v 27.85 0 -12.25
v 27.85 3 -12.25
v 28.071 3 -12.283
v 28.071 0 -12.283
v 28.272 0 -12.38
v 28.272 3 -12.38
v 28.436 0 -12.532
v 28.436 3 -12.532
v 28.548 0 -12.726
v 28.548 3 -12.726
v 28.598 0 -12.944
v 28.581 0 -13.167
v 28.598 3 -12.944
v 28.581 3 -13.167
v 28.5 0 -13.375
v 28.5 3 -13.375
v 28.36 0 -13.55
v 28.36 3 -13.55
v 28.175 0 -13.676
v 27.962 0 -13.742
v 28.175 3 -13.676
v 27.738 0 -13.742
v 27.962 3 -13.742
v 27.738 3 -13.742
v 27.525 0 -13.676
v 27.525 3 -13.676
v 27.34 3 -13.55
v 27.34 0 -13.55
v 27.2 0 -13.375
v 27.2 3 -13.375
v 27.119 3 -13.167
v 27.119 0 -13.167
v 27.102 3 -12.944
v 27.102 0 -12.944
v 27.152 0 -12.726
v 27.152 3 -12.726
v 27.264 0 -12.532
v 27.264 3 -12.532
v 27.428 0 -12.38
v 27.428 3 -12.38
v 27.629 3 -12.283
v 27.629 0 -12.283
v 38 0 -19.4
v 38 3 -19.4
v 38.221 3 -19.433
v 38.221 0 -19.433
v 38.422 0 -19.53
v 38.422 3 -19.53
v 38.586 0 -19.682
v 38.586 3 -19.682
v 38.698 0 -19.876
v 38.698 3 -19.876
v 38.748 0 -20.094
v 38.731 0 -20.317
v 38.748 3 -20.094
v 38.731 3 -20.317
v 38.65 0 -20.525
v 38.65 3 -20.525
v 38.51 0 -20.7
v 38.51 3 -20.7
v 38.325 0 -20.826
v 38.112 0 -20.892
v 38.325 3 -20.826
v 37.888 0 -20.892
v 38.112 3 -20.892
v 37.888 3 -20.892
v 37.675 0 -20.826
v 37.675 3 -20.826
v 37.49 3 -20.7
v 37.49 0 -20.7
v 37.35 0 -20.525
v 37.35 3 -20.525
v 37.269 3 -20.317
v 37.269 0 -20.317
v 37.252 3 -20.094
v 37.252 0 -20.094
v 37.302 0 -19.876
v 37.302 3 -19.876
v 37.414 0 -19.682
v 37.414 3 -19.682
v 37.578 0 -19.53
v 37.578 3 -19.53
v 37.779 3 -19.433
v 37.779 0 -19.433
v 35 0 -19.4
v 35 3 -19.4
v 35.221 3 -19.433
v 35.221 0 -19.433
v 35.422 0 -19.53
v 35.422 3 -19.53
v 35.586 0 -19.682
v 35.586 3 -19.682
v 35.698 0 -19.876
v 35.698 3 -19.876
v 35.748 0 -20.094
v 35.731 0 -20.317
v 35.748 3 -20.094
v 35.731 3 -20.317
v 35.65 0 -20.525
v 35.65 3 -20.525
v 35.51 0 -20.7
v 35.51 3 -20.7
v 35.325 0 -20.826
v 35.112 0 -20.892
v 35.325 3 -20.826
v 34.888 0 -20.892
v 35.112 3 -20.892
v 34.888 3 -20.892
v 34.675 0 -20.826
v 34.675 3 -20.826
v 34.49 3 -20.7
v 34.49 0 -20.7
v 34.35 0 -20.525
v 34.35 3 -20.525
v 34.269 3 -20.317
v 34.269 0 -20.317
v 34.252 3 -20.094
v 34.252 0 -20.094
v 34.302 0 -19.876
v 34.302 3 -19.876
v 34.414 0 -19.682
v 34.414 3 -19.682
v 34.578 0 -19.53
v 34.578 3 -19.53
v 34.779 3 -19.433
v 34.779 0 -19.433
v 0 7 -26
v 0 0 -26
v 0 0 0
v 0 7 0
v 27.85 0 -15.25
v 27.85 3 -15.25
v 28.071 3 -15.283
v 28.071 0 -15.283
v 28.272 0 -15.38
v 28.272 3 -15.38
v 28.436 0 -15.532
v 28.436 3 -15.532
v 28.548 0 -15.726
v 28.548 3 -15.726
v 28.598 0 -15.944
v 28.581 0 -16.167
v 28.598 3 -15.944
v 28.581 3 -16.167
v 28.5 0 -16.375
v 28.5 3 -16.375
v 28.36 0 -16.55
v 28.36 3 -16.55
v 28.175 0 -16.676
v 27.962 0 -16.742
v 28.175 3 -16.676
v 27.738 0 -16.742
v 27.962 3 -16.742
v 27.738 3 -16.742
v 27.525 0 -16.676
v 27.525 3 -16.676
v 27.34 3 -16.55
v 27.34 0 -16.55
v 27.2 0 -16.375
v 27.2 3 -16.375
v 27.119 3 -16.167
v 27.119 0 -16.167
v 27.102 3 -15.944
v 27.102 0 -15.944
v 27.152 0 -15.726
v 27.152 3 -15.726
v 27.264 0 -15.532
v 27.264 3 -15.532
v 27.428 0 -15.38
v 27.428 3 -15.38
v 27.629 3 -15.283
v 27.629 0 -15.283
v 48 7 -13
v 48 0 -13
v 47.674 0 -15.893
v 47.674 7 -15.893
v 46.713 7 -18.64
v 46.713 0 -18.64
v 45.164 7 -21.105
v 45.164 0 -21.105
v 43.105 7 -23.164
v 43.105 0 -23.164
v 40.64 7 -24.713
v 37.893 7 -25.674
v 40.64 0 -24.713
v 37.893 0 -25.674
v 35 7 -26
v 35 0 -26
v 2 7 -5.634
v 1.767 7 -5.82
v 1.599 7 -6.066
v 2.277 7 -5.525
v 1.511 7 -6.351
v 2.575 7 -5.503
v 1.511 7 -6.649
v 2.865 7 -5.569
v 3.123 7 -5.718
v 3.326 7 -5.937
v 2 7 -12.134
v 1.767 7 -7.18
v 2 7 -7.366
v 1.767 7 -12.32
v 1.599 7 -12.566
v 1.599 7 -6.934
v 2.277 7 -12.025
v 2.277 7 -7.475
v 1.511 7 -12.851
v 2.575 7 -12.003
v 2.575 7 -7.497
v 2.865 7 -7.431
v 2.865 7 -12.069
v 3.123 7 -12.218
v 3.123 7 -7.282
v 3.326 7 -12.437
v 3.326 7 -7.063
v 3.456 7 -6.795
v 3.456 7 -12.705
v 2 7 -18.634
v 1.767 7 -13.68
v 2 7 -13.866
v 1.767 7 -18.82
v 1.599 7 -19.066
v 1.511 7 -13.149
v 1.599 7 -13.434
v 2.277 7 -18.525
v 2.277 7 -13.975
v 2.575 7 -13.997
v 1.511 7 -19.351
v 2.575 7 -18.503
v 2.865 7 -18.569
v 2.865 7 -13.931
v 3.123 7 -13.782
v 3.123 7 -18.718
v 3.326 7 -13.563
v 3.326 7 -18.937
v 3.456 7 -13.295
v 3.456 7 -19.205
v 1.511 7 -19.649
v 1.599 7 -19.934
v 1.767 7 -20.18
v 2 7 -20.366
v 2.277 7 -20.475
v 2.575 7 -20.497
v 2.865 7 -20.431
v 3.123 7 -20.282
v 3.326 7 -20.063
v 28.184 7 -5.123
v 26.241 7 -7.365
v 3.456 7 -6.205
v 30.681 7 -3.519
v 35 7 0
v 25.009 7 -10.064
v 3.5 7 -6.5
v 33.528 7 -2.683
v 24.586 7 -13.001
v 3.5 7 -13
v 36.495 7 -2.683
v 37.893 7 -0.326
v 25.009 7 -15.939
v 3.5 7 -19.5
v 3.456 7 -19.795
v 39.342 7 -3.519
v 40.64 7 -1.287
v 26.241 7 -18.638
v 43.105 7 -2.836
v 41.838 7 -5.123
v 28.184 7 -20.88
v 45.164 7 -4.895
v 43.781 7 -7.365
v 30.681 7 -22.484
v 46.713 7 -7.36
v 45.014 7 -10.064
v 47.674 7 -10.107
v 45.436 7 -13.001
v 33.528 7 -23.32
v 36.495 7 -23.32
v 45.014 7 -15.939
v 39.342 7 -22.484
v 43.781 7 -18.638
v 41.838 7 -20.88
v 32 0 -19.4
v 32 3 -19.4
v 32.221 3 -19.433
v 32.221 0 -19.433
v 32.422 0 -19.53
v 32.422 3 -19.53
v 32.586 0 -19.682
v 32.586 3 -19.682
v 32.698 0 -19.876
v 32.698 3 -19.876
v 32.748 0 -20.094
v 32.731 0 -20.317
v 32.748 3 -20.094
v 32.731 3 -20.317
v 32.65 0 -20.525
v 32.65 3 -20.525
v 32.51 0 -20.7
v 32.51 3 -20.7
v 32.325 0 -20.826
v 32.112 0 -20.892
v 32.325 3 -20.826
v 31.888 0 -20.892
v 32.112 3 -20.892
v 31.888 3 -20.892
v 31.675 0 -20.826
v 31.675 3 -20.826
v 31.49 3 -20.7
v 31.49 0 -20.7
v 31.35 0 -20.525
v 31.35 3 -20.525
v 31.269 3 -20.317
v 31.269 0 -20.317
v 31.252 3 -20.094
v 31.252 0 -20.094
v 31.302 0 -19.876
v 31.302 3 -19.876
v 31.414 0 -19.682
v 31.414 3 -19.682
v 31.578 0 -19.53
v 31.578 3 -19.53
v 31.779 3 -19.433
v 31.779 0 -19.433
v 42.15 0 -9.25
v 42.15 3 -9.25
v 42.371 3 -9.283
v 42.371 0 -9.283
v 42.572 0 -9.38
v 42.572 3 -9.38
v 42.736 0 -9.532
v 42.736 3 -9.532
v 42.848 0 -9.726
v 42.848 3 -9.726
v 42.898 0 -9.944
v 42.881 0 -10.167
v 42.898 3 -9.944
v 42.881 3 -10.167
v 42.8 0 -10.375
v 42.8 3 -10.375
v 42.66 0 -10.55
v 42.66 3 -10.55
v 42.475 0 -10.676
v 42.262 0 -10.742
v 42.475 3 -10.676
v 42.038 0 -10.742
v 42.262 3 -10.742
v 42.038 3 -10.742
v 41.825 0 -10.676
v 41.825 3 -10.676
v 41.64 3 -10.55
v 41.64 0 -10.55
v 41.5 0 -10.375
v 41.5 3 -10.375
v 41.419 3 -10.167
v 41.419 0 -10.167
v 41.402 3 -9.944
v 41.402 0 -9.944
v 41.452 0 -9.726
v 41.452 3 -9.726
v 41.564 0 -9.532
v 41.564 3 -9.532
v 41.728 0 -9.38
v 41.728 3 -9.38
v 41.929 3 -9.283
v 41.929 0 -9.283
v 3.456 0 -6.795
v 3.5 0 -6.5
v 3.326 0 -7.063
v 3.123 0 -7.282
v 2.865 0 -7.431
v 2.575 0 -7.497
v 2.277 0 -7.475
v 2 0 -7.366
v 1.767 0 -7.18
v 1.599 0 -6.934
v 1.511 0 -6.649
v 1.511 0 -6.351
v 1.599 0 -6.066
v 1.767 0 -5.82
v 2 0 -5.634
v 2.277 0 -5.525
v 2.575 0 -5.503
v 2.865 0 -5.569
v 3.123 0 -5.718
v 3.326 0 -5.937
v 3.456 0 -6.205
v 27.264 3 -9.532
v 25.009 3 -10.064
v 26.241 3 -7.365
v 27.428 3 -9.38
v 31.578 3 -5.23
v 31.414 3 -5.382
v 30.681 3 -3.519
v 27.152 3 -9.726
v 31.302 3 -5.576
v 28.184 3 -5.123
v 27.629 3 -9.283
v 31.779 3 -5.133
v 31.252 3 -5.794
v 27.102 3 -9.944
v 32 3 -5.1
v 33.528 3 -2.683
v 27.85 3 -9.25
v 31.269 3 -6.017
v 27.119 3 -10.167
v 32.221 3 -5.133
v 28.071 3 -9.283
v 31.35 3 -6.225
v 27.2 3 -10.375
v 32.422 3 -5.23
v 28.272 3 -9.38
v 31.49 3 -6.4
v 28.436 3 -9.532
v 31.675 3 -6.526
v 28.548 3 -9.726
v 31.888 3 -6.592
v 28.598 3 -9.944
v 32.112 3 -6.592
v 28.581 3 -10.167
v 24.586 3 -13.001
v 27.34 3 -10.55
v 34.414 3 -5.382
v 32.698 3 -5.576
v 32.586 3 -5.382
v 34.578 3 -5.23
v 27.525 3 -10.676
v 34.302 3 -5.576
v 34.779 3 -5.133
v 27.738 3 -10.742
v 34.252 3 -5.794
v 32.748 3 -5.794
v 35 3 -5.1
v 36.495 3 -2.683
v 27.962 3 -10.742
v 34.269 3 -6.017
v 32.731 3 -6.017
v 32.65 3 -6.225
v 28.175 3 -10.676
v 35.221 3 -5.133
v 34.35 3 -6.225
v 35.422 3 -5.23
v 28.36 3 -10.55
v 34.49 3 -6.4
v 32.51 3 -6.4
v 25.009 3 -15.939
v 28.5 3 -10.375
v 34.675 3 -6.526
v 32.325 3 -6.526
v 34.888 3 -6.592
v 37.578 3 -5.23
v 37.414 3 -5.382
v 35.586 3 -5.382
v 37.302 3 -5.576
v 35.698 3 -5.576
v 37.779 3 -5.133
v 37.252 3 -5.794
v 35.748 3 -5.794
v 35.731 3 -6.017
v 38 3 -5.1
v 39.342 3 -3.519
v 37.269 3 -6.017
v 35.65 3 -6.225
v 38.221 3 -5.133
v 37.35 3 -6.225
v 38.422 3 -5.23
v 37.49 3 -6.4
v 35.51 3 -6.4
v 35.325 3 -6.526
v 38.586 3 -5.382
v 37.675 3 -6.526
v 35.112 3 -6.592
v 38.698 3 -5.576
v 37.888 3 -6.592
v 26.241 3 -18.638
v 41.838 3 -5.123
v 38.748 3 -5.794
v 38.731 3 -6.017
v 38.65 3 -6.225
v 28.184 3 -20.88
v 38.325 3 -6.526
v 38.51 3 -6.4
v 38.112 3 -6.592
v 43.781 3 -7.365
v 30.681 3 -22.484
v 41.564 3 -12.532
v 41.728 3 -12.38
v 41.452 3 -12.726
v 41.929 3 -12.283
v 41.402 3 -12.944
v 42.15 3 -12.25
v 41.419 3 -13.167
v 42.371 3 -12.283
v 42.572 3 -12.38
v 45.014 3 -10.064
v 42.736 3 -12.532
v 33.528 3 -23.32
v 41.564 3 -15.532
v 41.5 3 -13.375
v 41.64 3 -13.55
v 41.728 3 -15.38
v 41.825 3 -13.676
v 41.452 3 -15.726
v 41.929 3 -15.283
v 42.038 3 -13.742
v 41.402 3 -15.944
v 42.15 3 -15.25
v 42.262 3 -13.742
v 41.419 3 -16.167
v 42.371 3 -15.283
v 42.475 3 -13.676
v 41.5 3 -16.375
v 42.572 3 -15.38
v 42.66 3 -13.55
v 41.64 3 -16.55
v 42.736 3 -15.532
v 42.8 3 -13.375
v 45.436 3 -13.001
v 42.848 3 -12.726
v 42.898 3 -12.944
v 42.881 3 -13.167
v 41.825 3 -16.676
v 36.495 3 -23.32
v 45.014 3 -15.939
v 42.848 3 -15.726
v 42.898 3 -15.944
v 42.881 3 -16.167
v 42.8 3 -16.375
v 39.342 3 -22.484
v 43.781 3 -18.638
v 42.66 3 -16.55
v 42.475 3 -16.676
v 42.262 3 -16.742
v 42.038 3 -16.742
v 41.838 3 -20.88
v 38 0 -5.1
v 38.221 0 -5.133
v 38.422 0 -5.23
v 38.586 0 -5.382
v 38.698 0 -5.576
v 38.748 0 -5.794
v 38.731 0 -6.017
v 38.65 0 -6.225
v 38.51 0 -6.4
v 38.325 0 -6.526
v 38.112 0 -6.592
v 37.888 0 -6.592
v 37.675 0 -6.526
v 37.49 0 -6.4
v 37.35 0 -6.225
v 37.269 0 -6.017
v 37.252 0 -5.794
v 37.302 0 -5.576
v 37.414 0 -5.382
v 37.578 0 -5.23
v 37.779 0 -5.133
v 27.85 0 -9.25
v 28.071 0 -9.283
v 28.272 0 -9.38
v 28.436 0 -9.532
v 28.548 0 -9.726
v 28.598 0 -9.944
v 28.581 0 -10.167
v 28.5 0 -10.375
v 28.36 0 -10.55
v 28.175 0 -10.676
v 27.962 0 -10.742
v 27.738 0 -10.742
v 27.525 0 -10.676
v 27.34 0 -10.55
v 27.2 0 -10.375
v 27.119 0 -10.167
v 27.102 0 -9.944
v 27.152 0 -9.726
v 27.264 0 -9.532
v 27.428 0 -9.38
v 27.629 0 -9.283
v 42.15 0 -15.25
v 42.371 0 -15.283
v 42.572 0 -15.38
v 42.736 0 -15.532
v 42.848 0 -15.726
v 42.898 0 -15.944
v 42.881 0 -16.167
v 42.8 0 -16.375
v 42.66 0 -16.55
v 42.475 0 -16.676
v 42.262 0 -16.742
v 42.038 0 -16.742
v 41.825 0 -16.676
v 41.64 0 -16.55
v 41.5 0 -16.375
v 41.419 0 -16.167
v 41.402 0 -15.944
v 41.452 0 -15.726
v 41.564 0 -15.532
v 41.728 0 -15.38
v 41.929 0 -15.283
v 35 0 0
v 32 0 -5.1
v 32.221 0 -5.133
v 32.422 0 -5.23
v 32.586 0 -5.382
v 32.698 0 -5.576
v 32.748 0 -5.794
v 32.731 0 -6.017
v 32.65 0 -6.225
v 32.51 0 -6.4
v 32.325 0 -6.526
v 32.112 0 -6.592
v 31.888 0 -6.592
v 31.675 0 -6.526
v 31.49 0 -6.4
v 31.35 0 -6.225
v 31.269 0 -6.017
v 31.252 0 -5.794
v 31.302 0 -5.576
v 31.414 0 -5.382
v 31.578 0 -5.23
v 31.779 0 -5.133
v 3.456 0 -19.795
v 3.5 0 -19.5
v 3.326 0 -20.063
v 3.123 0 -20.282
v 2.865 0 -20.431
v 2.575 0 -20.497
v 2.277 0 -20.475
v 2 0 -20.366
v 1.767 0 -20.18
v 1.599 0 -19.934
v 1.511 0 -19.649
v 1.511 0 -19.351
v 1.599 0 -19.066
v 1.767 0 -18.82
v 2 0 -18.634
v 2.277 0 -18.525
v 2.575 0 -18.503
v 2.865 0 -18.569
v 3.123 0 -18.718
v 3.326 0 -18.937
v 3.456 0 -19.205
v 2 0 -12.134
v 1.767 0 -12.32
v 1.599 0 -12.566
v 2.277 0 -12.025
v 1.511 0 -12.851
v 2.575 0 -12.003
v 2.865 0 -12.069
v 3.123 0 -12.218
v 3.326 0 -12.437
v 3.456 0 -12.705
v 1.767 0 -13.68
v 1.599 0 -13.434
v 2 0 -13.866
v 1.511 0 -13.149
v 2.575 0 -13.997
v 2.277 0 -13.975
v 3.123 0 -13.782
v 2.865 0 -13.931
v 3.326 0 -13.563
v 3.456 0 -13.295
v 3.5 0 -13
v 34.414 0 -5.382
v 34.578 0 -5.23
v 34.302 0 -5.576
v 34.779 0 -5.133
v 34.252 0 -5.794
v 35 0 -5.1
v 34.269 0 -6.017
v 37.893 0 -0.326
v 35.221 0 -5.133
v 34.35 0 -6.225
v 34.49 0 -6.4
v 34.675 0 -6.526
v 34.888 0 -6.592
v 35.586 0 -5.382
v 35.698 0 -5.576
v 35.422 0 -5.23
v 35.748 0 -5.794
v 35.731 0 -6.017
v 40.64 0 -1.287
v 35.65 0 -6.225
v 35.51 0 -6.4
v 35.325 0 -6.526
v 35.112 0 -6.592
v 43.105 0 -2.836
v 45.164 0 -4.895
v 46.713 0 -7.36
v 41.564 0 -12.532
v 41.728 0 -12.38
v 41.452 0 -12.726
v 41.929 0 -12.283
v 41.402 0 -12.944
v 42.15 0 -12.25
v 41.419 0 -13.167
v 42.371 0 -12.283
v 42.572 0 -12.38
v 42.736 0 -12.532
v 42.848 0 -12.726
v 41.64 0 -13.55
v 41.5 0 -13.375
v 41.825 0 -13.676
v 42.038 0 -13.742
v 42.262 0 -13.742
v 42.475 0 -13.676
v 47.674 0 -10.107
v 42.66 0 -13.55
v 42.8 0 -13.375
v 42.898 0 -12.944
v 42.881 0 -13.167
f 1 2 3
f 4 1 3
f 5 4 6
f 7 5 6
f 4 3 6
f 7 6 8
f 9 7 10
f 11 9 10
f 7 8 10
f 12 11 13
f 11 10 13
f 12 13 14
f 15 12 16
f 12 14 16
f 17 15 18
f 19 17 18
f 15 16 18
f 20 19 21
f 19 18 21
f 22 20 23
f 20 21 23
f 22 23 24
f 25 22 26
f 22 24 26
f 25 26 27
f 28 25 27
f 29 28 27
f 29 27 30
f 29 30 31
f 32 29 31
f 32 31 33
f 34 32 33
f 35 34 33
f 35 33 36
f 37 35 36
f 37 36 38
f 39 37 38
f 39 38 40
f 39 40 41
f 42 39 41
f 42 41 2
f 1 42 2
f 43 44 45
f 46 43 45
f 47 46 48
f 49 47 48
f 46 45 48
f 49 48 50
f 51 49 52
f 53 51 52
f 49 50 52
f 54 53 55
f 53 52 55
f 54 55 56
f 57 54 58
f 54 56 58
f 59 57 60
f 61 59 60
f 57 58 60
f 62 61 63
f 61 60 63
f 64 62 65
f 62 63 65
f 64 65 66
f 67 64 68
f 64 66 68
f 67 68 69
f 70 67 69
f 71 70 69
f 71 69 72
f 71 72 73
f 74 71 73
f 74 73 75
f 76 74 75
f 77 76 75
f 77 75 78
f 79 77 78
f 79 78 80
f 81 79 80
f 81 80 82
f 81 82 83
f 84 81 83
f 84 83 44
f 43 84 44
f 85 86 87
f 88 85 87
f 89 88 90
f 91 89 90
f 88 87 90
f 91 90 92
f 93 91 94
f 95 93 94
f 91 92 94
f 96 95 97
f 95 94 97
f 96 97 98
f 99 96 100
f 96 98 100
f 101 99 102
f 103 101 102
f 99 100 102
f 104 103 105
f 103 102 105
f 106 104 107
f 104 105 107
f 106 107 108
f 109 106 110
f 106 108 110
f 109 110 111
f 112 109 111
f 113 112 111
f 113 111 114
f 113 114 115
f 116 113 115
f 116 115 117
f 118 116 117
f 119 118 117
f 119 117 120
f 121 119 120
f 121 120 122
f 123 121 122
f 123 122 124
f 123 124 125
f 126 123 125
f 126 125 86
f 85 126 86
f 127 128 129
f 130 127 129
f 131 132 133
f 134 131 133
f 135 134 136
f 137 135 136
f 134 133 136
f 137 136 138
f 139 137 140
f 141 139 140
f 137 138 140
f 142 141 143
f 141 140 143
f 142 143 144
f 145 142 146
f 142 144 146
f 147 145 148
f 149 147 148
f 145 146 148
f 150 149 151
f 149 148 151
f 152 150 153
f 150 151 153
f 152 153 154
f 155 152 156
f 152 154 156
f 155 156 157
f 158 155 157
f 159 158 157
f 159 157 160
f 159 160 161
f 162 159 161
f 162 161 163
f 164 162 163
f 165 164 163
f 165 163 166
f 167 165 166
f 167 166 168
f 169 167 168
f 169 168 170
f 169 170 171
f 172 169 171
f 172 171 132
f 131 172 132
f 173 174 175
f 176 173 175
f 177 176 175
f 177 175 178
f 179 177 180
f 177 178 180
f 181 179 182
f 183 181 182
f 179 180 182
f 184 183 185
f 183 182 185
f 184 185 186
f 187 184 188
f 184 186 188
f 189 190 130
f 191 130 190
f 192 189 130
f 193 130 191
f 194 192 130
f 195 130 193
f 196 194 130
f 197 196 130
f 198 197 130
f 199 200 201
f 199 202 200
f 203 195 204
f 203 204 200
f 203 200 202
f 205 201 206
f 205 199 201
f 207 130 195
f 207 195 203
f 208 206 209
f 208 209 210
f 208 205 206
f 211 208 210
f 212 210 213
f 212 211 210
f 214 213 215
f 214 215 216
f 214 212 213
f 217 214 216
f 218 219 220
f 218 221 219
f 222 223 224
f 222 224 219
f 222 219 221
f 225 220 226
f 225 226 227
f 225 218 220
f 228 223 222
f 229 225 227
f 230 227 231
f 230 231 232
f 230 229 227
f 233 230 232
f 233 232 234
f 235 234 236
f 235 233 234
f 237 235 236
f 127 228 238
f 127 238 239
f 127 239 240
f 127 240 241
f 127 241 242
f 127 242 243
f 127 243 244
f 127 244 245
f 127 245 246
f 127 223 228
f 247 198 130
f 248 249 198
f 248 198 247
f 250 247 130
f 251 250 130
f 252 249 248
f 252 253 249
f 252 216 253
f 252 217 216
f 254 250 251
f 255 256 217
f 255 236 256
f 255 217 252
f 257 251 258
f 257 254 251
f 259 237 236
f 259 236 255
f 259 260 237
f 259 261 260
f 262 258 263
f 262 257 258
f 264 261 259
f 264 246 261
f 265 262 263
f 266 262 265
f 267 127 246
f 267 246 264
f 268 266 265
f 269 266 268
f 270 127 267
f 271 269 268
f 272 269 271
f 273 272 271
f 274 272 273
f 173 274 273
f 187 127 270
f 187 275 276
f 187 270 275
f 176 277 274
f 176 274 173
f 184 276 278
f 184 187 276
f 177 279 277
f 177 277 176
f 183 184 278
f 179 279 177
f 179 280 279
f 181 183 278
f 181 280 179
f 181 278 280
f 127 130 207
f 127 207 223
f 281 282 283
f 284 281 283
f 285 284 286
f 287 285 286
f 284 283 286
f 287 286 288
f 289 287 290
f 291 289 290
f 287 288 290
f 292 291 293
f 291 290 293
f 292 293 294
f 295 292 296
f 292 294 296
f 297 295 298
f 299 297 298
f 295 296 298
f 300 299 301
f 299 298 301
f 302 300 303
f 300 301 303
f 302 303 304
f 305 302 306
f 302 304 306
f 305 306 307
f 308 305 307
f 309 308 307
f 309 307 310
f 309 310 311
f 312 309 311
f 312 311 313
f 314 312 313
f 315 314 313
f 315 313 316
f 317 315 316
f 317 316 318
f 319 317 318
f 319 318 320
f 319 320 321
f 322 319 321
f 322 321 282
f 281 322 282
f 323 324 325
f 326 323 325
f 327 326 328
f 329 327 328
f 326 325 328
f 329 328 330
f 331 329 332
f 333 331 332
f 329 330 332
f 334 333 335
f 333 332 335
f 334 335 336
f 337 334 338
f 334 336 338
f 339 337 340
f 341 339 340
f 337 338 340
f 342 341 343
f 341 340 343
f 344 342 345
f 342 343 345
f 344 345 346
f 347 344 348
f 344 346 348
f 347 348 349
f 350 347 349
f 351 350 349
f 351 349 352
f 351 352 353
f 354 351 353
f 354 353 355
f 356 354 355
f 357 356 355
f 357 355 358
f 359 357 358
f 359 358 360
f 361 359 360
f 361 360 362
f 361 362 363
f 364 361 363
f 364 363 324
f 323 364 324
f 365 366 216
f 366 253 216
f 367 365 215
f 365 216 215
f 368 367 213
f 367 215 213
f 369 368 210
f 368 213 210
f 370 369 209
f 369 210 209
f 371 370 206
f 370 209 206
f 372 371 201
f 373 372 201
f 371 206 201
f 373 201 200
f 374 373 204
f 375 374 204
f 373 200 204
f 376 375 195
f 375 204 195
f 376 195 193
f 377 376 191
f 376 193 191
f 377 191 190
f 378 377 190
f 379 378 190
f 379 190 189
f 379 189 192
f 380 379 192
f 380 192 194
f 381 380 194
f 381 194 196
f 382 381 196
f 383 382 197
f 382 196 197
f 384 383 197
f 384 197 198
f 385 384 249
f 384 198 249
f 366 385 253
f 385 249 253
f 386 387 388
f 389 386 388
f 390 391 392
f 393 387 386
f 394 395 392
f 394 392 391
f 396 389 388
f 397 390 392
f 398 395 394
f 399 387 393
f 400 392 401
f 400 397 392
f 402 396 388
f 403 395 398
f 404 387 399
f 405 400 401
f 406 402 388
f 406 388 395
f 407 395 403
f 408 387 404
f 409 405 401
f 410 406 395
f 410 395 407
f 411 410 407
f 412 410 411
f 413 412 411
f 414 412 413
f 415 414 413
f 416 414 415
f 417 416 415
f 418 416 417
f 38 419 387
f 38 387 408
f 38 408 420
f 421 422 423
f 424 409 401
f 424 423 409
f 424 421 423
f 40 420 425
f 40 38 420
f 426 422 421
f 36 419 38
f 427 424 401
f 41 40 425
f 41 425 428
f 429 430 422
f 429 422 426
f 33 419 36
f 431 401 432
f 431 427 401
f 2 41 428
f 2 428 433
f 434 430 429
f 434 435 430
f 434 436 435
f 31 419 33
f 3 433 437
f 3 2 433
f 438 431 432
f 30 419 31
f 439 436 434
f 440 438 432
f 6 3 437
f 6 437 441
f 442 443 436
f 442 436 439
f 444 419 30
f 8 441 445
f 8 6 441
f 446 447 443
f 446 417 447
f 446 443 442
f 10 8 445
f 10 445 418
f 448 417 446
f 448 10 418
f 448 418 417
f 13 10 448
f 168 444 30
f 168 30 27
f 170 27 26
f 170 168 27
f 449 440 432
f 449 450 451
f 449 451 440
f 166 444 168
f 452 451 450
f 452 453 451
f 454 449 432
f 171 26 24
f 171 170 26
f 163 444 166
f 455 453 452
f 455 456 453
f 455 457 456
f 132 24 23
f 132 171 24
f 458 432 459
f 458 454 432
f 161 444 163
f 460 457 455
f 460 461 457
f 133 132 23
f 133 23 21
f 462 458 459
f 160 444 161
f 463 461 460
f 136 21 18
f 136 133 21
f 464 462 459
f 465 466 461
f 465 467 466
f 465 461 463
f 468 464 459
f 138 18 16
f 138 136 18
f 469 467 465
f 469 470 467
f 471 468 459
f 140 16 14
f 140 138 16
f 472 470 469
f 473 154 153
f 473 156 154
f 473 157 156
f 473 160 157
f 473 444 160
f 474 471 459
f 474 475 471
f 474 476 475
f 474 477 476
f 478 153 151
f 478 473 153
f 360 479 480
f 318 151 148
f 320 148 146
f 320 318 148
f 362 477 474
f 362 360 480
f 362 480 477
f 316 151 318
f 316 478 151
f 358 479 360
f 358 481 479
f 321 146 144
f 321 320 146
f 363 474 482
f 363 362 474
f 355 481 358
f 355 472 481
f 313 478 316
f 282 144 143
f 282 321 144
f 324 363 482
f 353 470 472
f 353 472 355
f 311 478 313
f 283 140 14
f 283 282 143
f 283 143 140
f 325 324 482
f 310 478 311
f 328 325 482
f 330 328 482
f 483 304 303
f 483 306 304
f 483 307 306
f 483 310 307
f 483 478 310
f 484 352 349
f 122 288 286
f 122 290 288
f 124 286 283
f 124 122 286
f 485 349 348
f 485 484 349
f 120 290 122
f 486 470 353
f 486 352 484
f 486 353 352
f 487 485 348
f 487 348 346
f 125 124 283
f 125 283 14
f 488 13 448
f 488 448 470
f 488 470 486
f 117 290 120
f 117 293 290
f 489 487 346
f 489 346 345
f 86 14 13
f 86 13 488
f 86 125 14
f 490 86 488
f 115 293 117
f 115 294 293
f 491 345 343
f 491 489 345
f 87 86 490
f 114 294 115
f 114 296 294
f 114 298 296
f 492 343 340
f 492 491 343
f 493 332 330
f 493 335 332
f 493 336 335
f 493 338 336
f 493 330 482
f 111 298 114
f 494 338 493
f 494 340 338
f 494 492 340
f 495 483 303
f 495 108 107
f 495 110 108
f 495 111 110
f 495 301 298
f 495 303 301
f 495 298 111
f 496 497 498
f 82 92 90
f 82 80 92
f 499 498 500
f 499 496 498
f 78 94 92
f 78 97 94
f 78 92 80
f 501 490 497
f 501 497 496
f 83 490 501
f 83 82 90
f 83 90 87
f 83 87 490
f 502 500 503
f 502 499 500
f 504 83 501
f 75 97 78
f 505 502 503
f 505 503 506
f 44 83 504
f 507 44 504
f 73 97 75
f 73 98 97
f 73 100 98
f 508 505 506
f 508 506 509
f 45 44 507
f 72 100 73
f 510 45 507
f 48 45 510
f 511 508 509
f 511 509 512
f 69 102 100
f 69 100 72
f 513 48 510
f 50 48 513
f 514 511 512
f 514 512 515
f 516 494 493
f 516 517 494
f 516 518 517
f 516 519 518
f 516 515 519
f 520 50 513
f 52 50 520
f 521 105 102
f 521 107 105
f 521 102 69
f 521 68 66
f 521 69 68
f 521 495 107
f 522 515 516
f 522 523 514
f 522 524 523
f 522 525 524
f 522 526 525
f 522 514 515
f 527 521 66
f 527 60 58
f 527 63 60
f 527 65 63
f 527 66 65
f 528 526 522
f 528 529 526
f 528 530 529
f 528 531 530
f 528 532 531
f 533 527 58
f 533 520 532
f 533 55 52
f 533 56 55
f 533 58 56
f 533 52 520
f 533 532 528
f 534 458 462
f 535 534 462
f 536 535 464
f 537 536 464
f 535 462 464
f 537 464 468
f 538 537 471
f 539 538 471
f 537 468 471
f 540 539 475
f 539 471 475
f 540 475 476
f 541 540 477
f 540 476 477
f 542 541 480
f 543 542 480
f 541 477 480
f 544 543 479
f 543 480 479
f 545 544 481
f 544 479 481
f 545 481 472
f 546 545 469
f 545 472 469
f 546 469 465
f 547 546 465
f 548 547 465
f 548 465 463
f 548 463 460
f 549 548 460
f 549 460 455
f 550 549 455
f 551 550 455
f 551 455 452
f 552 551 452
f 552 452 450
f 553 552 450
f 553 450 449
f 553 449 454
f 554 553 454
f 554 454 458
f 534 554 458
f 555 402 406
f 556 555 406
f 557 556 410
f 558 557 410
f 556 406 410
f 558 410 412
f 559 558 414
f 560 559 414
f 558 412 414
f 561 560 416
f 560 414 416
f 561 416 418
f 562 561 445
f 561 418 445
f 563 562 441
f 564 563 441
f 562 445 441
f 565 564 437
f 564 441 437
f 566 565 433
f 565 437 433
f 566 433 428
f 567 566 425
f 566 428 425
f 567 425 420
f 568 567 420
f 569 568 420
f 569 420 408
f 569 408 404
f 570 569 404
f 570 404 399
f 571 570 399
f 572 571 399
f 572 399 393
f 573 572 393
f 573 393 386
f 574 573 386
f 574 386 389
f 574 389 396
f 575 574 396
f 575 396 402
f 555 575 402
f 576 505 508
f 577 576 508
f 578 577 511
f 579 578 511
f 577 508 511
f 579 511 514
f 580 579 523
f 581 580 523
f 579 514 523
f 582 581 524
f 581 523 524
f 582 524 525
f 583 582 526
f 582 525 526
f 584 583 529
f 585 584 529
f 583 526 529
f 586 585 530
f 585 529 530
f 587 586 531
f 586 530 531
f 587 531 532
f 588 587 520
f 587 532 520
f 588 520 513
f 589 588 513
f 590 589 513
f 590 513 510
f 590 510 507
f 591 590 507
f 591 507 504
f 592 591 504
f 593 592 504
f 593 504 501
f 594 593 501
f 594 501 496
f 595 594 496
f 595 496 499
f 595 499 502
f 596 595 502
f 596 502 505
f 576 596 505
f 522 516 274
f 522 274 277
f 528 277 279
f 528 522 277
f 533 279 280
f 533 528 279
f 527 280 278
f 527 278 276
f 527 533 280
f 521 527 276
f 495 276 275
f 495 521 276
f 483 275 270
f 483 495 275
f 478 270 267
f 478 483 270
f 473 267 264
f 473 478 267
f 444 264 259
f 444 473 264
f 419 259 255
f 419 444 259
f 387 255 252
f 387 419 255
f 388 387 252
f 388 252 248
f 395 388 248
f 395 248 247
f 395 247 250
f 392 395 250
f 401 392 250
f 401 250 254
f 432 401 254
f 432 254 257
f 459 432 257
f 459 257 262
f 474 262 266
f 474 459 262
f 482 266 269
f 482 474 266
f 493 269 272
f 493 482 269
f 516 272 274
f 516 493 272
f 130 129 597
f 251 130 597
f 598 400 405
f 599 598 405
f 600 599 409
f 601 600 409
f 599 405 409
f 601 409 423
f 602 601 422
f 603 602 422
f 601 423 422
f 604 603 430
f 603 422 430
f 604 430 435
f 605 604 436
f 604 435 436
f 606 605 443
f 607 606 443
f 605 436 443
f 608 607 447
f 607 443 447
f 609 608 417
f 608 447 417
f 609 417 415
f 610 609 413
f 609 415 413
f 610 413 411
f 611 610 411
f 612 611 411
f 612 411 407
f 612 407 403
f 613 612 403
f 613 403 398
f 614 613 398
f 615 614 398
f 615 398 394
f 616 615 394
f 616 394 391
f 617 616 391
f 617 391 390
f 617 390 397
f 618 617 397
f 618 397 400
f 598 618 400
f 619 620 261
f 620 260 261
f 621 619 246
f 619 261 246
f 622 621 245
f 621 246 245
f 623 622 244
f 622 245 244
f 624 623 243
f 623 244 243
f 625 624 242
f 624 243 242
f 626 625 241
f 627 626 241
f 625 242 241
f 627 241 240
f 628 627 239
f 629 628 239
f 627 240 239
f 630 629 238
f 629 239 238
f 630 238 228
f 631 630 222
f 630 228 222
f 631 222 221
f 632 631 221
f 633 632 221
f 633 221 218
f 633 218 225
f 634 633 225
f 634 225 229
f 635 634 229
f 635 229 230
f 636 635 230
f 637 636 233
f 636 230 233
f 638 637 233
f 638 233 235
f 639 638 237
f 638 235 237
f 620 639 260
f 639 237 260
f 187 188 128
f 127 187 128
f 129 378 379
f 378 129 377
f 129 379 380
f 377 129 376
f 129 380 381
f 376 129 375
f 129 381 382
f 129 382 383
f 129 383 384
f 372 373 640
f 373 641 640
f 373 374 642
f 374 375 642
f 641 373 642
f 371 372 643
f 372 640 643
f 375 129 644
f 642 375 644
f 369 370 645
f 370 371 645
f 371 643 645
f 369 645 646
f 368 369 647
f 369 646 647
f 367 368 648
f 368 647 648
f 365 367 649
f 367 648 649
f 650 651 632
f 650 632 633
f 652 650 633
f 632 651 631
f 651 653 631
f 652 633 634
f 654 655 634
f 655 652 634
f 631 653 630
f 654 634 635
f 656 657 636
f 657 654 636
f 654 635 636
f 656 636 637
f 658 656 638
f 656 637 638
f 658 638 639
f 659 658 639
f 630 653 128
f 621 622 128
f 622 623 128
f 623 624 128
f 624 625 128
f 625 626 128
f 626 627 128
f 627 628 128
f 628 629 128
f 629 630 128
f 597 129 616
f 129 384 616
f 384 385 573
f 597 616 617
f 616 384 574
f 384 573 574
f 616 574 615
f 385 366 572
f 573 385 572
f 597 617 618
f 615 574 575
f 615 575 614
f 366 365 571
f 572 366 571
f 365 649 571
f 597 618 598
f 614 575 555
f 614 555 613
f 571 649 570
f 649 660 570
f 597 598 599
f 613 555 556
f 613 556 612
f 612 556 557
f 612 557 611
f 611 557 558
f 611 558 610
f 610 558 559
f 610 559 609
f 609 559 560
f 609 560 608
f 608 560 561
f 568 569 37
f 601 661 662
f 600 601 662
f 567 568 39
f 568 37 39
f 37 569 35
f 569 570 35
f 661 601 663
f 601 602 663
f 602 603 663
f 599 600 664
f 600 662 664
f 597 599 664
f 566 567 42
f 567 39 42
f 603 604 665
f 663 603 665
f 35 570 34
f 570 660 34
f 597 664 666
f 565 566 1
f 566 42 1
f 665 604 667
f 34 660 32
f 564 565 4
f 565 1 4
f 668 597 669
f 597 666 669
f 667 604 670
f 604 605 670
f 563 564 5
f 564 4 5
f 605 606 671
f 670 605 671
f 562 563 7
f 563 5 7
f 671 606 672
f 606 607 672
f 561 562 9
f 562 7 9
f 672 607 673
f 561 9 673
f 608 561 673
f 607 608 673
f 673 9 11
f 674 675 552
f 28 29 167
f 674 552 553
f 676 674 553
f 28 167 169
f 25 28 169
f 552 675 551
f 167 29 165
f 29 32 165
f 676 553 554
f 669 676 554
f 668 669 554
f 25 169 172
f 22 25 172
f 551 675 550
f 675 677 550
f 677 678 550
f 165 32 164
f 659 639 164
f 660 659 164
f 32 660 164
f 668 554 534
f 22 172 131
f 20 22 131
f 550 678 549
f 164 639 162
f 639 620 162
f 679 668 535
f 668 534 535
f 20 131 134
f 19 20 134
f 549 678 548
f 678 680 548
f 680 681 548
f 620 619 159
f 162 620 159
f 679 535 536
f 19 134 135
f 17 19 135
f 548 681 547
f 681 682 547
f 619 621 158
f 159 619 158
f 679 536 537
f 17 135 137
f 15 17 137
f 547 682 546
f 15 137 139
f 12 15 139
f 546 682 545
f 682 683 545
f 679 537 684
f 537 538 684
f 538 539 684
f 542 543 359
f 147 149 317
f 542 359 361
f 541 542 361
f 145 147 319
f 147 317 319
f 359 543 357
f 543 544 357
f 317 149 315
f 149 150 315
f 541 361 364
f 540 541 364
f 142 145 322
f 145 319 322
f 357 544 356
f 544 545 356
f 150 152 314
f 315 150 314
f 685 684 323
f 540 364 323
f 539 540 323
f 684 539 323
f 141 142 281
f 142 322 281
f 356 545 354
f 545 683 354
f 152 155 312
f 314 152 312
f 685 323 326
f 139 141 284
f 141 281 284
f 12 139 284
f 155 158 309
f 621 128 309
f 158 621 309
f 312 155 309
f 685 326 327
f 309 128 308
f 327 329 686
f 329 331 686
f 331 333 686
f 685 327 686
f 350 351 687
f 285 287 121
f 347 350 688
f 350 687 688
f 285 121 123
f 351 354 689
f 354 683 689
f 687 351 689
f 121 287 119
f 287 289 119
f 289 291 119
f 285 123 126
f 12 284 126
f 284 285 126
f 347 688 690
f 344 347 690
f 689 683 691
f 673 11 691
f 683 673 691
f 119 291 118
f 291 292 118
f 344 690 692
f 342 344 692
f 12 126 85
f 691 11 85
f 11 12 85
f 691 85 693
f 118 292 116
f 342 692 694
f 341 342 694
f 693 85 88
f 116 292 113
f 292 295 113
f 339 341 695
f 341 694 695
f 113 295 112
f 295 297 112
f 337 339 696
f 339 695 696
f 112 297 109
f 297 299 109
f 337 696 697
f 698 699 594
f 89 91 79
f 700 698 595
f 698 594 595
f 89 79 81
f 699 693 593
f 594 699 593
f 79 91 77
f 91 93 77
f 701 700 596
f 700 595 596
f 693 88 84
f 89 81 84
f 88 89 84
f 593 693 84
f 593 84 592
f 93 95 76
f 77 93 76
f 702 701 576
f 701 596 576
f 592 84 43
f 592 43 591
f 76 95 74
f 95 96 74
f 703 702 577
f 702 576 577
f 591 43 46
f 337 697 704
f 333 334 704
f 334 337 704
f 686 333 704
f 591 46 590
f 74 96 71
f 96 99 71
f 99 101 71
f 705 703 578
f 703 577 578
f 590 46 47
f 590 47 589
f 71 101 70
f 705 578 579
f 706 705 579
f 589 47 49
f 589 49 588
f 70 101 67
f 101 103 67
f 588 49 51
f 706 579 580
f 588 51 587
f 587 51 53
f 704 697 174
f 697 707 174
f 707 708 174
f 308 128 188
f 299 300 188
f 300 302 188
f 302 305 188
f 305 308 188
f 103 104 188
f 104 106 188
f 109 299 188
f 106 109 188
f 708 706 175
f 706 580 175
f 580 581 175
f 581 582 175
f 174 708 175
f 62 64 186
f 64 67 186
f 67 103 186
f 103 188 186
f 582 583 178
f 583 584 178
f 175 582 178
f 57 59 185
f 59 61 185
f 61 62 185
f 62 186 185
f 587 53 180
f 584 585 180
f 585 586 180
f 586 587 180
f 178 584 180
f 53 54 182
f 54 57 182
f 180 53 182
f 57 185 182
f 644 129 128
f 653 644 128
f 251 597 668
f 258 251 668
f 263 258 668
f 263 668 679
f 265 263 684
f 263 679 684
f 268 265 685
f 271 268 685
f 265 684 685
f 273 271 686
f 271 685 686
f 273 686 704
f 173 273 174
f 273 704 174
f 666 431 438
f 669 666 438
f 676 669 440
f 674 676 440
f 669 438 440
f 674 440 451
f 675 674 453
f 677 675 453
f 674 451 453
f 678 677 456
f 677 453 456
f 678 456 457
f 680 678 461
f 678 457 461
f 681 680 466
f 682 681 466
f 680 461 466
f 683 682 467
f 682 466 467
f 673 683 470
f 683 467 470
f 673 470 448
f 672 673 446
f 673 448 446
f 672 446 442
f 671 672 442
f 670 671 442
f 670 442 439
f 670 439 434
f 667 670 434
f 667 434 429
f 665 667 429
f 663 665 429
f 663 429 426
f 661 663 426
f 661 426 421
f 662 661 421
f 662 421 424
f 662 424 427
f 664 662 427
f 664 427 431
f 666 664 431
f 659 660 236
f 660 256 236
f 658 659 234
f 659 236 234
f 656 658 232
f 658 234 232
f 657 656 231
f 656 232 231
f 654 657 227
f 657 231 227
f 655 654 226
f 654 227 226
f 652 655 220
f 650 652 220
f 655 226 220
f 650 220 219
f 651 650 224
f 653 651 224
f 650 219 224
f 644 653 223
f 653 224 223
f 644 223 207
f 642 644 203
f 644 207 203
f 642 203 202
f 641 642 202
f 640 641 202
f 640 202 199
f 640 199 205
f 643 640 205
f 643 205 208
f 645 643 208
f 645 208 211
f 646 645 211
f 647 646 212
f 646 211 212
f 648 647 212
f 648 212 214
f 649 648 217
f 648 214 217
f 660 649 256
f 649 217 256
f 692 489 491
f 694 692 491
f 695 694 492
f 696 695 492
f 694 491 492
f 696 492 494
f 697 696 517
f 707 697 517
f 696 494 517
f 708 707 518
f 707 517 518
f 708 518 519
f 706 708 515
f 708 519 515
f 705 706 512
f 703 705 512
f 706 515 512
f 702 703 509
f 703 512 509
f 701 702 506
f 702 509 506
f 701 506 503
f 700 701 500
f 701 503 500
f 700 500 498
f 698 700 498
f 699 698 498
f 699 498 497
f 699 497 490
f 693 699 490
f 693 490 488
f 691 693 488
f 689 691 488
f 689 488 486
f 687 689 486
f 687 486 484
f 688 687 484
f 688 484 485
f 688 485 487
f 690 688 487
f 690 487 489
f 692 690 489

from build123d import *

# Parameters (mm, degrees)
BOSS_EXTRUDE1_DEPTH       = 7
HOLE3_START               = 3
HOLE3_OUTLINE_R           = 10.425
HOLE3_DEPTH               = 4
F_2_0MM_DOWEL_HOLE1_D     = 2
F_2_0MM_DOWEL_HOLE1_DEPTH = 7
F_2_0MM_DOWEL_HOLE1_TIP   = 0.600860619
F_1_5MM_DOWEL_HOLE1_D     = 1.5
F_1_5MM_DOWEL_HOLE1_DEPTH = 7
F_1_5MM_DOWEL_HOLE1_TIP   = 0.450645464


# Read off the part's stored shape, not the designer's step: Hole3
with BuildPart() as part:
    # Sketch1 → Boss-Extrude1 (new body)
    with BuildSketch(Plane(origin=(0, 0, 0), x_dir=(1, 0, 0), z_dir=(0, 1, 0))):
        with BuildLine():
            Line((0, 26), (0, 0))
            Line((0, 0), (35, 0))
            ThreePointArc((35, 0), (22, 13), (35, 26))
            Line((35, 26), (0, 26))
        make_face()
        with BuildLine():
            ThreePointArc((35, 26), (22, 13), (35, 0))
            Line((35, 0), (35, 26))
        make_face()
        with BuildLine():
            Line((35, 26), (35, 0))
            ThreePointArc((35, 0), (44.192388155, 3.807611845), (48, 13))
            ThreePointArc((48, 13), (44.192388155, 22.192388155), (35, 26))
        make_face()
    extrude(amount=BOSS_EXTRUDE1_DEPTH)

    # Hole3 outline → Hole3 (cut)
    with BuildSketch(Plane(origin=(0, 0, 0), x_dir=(1, 0, 0), z_dir=(0, 1, 0)).offset(HOLE3_START)):
        with Locations((35.011233351, 13.001482521)):
            Circle(HOLE3_OUTLINE_R)
    extrude(amount=HOLE3_DEPTH, mode=Mode.SUBTRACT)

    # Ø2.0mm Dowel Hole1
    with Locations(Plane(origin=(0, 0, 0), x_dir=(-1, 0, 0), z_dir=(0, -1, 0))):
        with Locations((-2.5, 6.5), (-2.5, 13), (-2.5, 19.5)):
            Hole(F_2_0MM_DOWEL_HOLE1_D / 2, depth=F_2_0MM_DOWEL_HOLE1_DEPTH)
            with Locations((0, 0, -(F_2_0MM_DOWEL_HOLE1_DEPTH + F_2_0MM_DOWEL_HOLE1_TIP / 2))):  # 118° drill point
                Cone(0, F_2_0MM_DOWEL_HOLE1_D / 2, F_2_0MM_DOWEL_HOLE1_TIP, mode=Mode.SUBTRACT)

    # Ø1.5mm Dowel Hole1
    with Locations(Plane(origin=(35, 0, -5.85), x_dir=(0, 0, -1), z_dir=(0, -1, 0))):
        with Locations((0, 0), (0, 3), (0, -3), (4.15, -7.15), (7.15, -7.15), (10.15, -7.15), (4.15, 7.15), (7.15, 7.15), (10.15, 7.15), (14.3, 0), (14.3, -3), (14.3, 3)):
            Hole(F_1_5MM_DOWEL_HOLE1_D / 2, depth=F_1_5MM_DOWEL_HOLE1_DEPTH)
            with Locations((0, 0, -(F_1_5MM_DOWEL_HOLE1_DEPTH + F_1_5MM_DOWEL_HOLE1_TIP / 2))):  # 118° drill point
                Cone(0, F_1_5MM_DOWEL_HOLE1_D / 2, F_1_5MM_DOWEL_HOLE1_TIP, mode=Mode.SUBTRACT)


solid = part.part
